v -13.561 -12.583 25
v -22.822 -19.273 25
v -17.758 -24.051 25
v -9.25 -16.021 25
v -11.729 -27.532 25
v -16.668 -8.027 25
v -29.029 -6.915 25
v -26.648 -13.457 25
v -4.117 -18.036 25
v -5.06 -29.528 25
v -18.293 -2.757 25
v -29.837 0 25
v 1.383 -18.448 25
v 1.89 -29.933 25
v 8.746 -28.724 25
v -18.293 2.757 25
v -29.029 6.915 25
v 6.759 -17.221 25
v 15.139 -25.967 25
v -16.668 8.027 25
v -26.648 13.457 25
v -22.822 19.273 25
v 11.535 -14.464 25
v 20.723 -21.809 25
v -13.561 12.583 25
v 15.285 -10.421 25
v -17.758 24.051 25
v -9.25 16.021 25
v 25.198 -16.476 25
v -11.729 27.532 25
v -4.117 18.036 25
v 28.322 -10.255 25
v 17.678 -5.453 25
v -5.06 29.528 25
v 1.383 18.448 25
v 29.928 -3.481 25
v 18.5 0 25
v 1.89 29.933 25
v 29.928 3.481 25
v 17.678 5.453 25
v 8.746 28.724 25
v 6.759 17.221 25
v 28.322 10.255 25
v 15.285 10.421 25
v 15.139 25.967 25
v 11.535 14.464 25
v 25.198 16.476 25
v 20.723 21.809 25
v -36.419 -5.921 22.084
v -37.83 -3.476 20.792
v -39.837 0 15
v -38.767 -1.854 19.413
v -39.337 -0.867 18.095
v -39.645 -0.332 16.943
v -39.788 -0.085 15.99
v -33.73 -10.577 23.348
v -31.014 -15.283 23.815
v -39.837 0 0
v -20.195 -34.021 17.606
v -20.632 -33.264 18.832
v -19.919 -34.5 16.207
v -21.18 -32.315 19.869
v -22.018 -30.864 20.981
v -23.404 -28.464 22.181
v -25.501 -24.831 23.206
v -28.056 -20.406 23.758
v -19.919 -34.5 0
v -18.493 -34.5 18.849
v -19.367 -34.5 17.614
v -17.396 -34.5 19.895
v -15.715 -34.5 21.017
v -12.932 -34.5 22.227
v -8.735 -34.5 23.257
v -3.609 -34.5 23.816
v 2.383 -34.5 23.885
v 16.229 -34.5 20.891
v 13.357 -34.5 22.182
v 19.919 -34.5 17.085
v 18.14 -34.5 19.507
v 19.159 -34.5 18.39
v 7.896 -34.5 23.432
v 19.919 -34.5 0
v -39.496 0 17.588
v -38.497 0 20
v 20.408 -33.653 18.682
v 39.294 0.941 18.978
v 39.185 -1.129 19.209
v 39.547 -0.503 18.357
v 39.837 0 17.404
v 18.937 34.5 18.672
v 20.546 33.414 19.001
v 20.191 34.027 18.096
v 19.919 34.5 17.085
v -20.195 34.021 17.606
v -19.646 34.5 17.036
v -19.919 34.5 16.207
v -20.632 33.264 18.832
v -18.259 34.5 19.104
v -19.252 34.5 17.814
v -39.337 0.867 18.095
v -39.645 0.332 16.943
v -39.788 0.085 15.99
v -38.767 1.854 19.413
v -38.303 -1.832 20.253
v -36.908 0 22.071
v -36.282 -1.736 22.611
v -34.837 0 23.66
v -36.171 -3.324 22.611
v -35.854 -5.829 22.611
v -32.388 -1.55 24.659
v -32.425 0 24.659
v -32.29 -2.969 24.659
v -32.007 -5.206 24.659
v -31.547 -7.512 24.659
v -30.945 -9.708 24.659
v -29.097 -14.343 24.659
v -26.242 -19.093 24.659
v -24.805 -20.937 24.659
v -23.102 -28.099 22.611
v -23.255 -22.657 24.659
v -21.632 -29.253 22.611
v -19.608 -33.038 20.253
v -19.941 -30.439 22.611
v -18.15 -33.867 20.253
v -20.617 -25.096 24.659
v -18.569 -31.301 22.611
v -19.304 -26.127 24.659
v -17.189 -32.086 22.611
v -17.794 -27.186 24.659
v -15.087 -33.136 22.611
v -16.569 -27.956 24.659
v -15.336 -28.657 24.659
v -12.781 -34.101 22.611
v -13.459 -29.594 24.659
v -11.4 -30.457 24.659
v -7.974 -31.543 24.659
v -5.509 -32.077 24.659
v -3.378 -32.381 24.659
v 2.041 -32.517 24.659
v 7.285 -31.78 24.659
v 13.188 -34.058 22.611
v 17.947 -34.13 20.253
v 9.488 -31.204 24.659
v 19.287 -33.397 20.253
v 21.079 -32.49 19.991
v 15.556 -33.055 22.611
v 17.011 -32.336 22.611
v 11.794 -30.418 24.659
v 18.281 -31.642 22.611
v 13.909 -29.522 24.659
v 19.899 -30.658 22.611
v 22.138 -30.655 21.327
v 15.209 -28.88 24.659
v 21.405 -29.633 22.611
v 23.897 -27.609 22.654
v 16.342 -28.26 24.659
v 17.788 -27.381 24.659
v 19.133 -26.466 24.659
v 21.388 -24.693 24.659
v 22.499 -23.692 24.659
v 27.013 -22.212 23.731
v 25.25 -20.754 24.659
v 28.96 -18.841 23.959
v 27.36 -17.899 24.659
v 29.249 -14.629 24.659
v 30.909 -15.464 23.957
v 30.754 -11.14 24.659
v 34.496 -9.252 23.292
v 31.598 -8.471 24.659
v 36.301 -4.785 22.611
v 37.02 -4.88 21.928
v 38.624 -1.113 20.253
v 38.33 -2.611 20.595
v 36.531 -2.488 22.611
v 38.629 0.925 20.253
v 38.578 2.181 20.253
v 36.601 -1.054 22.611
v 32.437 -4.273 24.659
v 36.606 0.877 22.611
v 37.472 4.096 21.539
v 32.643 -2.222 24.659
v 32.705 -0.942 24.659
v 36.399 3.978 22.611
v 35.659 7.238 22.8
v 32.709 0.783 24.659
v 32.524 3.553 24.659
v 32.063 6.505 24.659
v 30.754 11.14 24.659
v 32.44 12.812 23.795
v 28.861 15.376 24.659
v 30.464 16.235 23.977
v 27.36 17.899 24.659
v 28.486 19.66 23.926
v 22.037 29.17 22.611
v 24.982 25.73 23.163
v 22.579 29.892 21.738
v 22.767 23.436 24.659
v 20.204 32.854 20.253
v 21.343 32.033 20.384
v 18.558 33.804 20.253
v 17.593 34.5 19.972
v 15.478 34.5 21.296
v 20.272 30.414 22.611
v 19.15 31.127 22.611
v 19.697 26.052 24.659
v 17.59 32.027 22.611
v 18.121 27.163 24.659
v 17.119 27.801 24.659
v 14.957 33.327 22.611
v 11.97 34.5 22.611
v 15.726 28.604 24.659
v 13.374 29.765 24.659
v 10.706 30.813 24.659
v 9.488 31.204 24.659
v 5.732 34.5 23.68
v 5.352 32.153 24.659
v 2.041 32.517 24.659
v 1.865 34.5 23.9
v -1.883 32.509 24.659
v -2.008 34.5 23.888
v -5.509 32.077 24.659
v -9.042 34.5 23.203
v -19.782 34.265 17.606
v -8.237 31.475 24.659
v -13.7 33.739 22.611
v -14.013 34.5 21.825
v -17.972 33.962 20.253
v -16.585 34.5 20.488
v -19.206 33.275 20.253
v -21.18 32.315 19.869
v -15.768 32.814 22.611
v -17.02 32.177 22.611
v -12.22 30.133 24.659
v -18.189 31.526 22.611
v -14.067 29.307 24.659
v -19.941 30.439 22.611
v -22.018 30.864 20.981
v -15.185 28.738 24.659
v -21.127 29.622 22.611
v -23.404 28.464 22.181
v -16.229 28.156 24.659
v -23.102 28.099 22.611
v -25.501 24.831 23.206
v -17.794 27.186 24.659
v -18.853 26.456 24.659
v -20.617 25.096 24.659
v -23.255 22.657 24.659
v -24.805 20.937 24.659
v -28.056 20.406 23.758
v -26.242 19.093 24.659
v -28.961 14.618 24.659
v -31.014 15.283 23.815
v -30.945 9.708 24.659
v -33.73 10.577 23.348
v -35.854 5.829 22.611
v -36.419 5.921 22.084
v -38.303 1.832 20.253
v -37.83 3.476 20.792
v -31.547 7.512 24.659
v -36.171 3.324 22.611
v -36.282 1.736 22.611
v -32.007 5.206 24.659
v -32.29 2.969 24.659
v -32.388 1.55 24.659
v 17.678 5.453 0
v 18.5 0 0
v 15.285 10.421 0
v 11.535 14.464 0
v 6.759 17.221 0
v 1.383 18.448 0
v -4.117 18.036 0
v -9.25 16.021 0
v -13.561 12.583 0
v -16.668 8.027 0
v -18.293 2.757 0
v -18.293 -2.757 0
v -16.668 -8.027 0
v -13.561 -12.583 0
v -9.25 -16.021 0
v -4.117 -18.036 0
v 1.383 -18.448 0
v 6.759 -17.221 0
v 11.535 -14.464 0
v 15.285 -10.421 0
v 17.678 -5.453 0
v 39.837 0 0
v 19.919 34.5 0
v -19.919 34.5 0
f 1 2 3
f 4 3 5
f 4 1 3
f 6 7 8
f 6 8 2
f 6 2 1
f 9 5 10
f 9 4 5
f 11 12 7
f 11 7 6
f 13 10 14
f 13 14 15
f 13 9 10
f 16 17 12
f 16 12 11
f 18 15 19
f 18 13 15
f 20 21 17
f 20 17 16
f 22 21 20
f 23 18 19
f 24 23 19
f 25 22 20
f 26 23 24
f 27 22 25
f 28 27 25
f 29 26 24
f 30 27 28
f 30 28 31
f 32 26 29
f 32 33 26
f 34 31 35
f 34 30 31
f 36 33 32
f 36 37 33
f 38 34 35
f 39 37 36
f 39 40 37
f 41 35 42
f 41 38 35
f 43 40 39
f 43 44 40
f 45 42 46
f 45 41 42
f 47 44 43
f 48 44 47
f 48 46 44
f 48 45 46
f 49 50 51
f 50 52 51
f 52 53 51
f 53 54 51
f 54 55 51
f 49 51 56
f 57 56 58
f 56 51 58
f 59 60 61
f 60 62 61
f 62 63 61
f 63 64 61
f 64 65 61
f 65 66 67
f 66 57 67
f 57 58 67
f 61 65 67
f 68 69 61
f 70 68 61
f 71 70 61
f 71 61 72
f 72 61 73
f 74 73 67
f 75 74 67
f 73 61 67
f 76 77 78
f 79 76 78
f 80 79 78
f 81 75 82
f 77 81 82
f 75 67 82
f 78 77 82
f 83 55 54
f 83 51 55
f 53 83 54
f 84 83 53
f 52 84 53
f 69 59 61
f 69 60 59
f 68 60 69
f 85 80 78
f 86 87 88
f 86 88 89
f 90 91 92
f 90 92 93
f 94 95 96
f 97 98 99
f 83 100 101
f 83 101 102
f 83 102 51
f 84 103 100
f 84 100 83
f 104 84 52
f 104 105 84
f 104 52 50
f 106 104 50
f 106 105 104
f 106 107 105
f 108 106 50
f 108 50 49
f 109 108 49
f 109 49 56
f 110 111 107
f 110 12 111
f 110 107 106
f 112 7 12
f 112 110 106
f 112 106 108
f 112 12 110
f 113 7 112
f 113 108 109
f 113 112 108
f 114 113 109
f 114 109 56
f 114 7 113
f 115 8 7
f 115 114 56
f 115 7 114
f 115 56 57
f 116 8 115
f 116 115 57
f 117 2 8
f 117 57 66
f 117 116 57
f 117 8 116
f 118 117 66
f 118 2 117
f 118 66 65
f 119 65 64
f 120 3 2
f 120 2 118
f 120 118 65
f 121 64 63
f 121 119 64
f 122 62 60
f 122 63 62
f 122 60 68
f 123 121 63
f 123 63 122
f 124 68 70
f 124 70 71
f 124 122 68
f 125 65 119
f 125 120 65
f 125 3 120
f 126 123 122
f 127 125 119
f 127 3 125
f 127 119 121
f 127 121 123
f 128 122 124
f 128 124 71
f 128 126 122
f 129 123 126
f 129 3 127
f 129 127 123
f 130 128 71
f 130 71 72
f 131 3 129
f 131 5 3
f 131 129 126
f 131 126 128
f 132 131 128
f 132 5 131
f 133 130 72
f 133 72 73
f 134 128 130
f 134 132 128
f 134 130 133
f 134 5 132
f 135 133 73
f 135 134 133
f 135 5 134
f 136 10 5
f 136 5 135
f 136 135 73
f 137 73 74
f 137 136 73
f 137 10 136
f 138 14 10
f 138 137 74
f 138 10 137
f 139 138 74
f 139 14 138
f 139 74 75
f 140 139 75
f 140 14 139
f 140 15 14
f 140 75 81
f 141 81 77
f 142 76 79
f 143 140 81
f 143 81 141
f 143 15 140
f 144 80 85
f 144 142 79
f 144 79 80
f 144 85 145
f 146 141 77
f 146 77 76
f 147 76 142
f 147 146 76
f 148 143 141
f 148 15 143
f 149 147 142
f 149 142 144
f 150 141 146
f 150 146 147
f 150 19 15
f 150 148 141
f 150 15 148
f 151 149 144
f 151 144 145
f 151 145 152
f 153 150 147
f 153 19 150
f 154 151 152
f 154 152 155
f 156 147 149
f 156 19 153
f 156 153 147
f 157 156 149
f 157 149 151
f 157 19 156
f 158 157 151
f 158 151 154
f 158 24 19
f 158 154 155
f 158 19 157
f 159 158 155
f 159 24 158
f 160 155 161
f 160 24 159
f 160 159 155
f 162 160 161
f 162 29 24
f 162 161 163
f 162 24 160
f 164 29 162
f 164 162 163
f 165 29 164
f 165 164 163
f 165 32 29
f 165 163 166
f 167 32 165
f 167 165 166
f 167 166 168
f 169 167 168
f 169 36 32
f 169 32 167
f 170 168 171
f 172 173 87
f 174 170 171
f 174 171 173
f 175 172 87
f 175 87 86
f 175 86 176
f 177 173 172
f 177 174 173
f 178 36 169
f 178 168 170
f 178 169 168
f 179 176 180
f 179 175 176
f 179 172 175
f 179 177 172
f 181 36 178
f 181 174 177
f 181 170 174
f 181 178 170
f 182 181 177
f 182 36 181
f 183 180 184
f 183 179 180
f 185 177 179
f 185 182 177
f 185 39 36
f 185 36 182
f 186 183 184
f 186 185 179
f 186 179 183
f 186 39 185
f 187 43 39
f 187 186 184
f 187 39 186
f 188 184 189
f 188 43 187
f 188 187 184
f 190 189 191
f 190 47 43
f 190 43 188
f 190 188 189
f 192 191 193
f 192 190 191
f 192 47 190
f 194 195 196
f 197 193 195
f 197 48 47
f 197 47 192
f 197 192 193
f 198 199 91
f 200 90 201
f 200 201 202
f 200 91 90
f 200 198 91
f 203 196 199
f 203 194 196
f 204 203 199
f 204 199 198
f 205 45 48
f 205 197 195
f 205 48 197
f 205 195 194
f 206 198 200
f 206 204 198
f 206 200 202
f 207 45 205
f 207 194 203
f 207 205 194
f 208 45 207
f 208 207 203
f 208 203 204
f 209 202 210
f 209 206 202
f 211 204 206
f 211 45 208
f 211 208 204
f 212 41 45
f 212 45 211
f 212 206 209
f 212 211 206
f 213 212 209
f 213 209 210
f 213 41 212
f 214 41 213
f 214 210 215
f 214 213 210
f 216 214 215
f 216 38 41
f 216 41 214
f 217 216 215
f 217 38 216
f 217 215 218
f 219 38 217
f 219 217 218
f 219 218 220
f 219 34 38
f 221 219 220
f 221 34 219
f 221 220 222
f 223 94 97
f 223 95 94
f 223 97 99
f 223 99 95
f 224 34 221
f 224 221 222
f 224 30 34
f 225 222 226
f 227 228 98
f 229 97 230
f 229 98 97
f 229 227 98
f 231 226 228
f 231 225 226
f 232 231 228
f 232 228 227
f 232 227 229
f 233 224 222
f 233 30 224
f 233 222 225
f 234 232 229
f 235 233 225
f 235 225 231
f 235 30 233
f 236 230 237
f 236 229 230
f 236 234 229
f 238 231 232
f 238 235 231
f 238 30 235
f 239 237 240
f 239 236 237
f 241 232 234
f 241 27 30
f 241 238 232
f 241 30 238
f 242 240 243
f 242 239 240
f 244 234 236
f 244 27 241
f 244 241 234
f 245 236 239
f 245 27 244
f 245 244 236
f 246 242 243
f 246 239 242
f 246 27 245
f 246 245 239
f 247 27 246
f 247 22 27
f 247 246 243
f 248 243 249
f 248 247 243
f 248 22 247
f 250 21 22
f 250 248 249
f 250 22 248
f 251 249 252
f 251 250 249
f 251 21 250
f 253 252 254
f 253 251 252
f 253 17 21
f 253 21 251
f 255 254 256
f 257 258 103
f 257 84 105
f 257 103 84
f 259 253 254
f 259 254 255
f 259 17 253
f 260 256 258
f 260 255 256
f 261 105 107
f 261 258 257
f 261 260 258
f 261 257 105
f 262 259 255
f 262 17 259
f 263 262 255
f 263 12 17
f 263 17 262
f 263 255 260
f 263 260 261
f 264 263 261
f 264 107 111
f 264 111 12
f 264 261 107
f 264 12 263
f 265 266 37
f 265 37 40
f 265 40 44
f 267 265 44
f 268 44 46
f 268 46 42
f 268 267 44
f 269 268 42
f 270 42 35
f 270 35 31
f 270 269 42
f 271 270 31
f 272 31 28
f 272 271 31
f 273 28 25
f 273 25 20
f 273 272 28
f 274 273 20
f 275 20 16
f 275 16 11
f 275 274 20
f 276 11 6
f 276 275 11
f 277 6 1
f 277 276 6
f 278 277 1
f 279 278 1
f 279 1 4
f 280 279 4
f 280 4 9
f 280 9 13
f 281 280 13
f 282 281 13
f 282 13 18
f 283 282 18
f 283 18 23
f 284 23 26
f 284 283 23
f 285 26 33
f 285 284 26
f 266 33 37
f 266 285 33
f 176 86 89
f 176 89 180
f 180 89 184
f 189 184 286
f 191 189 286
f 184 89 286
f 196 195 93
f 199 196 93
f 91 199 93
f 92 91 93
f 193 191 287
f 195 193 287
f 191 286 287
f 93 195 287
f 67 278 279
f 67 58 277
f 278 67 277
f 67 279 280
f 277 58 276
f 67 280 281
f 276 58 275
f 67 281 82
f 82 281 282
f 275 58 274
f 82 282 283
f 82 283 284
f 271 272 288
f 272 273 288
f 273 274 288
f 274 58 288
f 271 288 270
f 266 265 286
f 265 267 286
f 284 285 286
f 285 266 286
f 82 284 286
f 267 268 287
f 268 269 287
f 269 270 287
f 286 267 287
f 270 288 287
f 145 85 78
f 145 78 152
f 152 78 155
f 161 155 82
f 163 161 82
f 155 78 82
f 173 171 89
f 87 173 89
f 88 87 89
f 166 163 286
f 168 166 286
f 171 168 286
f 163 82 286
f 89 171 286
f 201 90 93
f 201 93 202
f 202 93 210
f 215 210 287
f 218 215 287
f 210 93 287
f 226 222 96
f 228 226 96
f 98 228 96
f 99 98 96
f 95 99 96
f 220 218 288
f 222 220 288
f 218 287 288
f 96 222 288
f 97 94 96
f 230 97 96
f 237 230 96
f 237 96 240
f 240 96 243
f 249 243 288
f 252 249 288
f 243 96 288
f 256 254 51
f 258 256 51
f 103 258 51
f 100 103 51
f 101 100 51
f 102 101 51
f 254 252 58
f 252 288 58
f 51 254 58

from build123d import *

# Parameters (mm, degrees)
F0_R     = 18.5
F1_DEPTH = 25


with BuildPart() as f1:
    # F0 (on Top) → F1 (new body)
    with BuildSketch(Plane.XY):
        Polygon((19.918584, 34.5), (-19.918584, 34.5), (-39.837169, 0), (-19.918584, -34.5), (19.918584, -34.5), (39.837169, 0), align=None)
        Circle(F0_R, mode=Mode.SUBTRACT)
    extrude(amount=F1_DEPTH)

    # F2 (on Front) → F3 (revolve, cut)
    with BuildSketch(Plane.XZ):
        with BuildLine():
            Line((-48.746884, 0), (-39.837169, 0))
            Line((-39.837169, 0), (-39.837169, 15))
            ThreePointArc((-39.837169, 15), (-36.908236, 22.071068), (-29.837169, 25))
            Line((-29.837169, 25), (0.146632, 25))
            Line((0.146632, 25), (0.146632, 38.46572))
            Line((0.146632, 38.46572), (-48.746884, 38.46572))
            Line((-48.746884, 38.46572), (-48.746884, 0))
        make_face()
    revolve(axis=Axis((0.146632, 0, 31.73286), (0, 0, 1)), mode=Mode.SUBTRACT)


solid = f1.part
